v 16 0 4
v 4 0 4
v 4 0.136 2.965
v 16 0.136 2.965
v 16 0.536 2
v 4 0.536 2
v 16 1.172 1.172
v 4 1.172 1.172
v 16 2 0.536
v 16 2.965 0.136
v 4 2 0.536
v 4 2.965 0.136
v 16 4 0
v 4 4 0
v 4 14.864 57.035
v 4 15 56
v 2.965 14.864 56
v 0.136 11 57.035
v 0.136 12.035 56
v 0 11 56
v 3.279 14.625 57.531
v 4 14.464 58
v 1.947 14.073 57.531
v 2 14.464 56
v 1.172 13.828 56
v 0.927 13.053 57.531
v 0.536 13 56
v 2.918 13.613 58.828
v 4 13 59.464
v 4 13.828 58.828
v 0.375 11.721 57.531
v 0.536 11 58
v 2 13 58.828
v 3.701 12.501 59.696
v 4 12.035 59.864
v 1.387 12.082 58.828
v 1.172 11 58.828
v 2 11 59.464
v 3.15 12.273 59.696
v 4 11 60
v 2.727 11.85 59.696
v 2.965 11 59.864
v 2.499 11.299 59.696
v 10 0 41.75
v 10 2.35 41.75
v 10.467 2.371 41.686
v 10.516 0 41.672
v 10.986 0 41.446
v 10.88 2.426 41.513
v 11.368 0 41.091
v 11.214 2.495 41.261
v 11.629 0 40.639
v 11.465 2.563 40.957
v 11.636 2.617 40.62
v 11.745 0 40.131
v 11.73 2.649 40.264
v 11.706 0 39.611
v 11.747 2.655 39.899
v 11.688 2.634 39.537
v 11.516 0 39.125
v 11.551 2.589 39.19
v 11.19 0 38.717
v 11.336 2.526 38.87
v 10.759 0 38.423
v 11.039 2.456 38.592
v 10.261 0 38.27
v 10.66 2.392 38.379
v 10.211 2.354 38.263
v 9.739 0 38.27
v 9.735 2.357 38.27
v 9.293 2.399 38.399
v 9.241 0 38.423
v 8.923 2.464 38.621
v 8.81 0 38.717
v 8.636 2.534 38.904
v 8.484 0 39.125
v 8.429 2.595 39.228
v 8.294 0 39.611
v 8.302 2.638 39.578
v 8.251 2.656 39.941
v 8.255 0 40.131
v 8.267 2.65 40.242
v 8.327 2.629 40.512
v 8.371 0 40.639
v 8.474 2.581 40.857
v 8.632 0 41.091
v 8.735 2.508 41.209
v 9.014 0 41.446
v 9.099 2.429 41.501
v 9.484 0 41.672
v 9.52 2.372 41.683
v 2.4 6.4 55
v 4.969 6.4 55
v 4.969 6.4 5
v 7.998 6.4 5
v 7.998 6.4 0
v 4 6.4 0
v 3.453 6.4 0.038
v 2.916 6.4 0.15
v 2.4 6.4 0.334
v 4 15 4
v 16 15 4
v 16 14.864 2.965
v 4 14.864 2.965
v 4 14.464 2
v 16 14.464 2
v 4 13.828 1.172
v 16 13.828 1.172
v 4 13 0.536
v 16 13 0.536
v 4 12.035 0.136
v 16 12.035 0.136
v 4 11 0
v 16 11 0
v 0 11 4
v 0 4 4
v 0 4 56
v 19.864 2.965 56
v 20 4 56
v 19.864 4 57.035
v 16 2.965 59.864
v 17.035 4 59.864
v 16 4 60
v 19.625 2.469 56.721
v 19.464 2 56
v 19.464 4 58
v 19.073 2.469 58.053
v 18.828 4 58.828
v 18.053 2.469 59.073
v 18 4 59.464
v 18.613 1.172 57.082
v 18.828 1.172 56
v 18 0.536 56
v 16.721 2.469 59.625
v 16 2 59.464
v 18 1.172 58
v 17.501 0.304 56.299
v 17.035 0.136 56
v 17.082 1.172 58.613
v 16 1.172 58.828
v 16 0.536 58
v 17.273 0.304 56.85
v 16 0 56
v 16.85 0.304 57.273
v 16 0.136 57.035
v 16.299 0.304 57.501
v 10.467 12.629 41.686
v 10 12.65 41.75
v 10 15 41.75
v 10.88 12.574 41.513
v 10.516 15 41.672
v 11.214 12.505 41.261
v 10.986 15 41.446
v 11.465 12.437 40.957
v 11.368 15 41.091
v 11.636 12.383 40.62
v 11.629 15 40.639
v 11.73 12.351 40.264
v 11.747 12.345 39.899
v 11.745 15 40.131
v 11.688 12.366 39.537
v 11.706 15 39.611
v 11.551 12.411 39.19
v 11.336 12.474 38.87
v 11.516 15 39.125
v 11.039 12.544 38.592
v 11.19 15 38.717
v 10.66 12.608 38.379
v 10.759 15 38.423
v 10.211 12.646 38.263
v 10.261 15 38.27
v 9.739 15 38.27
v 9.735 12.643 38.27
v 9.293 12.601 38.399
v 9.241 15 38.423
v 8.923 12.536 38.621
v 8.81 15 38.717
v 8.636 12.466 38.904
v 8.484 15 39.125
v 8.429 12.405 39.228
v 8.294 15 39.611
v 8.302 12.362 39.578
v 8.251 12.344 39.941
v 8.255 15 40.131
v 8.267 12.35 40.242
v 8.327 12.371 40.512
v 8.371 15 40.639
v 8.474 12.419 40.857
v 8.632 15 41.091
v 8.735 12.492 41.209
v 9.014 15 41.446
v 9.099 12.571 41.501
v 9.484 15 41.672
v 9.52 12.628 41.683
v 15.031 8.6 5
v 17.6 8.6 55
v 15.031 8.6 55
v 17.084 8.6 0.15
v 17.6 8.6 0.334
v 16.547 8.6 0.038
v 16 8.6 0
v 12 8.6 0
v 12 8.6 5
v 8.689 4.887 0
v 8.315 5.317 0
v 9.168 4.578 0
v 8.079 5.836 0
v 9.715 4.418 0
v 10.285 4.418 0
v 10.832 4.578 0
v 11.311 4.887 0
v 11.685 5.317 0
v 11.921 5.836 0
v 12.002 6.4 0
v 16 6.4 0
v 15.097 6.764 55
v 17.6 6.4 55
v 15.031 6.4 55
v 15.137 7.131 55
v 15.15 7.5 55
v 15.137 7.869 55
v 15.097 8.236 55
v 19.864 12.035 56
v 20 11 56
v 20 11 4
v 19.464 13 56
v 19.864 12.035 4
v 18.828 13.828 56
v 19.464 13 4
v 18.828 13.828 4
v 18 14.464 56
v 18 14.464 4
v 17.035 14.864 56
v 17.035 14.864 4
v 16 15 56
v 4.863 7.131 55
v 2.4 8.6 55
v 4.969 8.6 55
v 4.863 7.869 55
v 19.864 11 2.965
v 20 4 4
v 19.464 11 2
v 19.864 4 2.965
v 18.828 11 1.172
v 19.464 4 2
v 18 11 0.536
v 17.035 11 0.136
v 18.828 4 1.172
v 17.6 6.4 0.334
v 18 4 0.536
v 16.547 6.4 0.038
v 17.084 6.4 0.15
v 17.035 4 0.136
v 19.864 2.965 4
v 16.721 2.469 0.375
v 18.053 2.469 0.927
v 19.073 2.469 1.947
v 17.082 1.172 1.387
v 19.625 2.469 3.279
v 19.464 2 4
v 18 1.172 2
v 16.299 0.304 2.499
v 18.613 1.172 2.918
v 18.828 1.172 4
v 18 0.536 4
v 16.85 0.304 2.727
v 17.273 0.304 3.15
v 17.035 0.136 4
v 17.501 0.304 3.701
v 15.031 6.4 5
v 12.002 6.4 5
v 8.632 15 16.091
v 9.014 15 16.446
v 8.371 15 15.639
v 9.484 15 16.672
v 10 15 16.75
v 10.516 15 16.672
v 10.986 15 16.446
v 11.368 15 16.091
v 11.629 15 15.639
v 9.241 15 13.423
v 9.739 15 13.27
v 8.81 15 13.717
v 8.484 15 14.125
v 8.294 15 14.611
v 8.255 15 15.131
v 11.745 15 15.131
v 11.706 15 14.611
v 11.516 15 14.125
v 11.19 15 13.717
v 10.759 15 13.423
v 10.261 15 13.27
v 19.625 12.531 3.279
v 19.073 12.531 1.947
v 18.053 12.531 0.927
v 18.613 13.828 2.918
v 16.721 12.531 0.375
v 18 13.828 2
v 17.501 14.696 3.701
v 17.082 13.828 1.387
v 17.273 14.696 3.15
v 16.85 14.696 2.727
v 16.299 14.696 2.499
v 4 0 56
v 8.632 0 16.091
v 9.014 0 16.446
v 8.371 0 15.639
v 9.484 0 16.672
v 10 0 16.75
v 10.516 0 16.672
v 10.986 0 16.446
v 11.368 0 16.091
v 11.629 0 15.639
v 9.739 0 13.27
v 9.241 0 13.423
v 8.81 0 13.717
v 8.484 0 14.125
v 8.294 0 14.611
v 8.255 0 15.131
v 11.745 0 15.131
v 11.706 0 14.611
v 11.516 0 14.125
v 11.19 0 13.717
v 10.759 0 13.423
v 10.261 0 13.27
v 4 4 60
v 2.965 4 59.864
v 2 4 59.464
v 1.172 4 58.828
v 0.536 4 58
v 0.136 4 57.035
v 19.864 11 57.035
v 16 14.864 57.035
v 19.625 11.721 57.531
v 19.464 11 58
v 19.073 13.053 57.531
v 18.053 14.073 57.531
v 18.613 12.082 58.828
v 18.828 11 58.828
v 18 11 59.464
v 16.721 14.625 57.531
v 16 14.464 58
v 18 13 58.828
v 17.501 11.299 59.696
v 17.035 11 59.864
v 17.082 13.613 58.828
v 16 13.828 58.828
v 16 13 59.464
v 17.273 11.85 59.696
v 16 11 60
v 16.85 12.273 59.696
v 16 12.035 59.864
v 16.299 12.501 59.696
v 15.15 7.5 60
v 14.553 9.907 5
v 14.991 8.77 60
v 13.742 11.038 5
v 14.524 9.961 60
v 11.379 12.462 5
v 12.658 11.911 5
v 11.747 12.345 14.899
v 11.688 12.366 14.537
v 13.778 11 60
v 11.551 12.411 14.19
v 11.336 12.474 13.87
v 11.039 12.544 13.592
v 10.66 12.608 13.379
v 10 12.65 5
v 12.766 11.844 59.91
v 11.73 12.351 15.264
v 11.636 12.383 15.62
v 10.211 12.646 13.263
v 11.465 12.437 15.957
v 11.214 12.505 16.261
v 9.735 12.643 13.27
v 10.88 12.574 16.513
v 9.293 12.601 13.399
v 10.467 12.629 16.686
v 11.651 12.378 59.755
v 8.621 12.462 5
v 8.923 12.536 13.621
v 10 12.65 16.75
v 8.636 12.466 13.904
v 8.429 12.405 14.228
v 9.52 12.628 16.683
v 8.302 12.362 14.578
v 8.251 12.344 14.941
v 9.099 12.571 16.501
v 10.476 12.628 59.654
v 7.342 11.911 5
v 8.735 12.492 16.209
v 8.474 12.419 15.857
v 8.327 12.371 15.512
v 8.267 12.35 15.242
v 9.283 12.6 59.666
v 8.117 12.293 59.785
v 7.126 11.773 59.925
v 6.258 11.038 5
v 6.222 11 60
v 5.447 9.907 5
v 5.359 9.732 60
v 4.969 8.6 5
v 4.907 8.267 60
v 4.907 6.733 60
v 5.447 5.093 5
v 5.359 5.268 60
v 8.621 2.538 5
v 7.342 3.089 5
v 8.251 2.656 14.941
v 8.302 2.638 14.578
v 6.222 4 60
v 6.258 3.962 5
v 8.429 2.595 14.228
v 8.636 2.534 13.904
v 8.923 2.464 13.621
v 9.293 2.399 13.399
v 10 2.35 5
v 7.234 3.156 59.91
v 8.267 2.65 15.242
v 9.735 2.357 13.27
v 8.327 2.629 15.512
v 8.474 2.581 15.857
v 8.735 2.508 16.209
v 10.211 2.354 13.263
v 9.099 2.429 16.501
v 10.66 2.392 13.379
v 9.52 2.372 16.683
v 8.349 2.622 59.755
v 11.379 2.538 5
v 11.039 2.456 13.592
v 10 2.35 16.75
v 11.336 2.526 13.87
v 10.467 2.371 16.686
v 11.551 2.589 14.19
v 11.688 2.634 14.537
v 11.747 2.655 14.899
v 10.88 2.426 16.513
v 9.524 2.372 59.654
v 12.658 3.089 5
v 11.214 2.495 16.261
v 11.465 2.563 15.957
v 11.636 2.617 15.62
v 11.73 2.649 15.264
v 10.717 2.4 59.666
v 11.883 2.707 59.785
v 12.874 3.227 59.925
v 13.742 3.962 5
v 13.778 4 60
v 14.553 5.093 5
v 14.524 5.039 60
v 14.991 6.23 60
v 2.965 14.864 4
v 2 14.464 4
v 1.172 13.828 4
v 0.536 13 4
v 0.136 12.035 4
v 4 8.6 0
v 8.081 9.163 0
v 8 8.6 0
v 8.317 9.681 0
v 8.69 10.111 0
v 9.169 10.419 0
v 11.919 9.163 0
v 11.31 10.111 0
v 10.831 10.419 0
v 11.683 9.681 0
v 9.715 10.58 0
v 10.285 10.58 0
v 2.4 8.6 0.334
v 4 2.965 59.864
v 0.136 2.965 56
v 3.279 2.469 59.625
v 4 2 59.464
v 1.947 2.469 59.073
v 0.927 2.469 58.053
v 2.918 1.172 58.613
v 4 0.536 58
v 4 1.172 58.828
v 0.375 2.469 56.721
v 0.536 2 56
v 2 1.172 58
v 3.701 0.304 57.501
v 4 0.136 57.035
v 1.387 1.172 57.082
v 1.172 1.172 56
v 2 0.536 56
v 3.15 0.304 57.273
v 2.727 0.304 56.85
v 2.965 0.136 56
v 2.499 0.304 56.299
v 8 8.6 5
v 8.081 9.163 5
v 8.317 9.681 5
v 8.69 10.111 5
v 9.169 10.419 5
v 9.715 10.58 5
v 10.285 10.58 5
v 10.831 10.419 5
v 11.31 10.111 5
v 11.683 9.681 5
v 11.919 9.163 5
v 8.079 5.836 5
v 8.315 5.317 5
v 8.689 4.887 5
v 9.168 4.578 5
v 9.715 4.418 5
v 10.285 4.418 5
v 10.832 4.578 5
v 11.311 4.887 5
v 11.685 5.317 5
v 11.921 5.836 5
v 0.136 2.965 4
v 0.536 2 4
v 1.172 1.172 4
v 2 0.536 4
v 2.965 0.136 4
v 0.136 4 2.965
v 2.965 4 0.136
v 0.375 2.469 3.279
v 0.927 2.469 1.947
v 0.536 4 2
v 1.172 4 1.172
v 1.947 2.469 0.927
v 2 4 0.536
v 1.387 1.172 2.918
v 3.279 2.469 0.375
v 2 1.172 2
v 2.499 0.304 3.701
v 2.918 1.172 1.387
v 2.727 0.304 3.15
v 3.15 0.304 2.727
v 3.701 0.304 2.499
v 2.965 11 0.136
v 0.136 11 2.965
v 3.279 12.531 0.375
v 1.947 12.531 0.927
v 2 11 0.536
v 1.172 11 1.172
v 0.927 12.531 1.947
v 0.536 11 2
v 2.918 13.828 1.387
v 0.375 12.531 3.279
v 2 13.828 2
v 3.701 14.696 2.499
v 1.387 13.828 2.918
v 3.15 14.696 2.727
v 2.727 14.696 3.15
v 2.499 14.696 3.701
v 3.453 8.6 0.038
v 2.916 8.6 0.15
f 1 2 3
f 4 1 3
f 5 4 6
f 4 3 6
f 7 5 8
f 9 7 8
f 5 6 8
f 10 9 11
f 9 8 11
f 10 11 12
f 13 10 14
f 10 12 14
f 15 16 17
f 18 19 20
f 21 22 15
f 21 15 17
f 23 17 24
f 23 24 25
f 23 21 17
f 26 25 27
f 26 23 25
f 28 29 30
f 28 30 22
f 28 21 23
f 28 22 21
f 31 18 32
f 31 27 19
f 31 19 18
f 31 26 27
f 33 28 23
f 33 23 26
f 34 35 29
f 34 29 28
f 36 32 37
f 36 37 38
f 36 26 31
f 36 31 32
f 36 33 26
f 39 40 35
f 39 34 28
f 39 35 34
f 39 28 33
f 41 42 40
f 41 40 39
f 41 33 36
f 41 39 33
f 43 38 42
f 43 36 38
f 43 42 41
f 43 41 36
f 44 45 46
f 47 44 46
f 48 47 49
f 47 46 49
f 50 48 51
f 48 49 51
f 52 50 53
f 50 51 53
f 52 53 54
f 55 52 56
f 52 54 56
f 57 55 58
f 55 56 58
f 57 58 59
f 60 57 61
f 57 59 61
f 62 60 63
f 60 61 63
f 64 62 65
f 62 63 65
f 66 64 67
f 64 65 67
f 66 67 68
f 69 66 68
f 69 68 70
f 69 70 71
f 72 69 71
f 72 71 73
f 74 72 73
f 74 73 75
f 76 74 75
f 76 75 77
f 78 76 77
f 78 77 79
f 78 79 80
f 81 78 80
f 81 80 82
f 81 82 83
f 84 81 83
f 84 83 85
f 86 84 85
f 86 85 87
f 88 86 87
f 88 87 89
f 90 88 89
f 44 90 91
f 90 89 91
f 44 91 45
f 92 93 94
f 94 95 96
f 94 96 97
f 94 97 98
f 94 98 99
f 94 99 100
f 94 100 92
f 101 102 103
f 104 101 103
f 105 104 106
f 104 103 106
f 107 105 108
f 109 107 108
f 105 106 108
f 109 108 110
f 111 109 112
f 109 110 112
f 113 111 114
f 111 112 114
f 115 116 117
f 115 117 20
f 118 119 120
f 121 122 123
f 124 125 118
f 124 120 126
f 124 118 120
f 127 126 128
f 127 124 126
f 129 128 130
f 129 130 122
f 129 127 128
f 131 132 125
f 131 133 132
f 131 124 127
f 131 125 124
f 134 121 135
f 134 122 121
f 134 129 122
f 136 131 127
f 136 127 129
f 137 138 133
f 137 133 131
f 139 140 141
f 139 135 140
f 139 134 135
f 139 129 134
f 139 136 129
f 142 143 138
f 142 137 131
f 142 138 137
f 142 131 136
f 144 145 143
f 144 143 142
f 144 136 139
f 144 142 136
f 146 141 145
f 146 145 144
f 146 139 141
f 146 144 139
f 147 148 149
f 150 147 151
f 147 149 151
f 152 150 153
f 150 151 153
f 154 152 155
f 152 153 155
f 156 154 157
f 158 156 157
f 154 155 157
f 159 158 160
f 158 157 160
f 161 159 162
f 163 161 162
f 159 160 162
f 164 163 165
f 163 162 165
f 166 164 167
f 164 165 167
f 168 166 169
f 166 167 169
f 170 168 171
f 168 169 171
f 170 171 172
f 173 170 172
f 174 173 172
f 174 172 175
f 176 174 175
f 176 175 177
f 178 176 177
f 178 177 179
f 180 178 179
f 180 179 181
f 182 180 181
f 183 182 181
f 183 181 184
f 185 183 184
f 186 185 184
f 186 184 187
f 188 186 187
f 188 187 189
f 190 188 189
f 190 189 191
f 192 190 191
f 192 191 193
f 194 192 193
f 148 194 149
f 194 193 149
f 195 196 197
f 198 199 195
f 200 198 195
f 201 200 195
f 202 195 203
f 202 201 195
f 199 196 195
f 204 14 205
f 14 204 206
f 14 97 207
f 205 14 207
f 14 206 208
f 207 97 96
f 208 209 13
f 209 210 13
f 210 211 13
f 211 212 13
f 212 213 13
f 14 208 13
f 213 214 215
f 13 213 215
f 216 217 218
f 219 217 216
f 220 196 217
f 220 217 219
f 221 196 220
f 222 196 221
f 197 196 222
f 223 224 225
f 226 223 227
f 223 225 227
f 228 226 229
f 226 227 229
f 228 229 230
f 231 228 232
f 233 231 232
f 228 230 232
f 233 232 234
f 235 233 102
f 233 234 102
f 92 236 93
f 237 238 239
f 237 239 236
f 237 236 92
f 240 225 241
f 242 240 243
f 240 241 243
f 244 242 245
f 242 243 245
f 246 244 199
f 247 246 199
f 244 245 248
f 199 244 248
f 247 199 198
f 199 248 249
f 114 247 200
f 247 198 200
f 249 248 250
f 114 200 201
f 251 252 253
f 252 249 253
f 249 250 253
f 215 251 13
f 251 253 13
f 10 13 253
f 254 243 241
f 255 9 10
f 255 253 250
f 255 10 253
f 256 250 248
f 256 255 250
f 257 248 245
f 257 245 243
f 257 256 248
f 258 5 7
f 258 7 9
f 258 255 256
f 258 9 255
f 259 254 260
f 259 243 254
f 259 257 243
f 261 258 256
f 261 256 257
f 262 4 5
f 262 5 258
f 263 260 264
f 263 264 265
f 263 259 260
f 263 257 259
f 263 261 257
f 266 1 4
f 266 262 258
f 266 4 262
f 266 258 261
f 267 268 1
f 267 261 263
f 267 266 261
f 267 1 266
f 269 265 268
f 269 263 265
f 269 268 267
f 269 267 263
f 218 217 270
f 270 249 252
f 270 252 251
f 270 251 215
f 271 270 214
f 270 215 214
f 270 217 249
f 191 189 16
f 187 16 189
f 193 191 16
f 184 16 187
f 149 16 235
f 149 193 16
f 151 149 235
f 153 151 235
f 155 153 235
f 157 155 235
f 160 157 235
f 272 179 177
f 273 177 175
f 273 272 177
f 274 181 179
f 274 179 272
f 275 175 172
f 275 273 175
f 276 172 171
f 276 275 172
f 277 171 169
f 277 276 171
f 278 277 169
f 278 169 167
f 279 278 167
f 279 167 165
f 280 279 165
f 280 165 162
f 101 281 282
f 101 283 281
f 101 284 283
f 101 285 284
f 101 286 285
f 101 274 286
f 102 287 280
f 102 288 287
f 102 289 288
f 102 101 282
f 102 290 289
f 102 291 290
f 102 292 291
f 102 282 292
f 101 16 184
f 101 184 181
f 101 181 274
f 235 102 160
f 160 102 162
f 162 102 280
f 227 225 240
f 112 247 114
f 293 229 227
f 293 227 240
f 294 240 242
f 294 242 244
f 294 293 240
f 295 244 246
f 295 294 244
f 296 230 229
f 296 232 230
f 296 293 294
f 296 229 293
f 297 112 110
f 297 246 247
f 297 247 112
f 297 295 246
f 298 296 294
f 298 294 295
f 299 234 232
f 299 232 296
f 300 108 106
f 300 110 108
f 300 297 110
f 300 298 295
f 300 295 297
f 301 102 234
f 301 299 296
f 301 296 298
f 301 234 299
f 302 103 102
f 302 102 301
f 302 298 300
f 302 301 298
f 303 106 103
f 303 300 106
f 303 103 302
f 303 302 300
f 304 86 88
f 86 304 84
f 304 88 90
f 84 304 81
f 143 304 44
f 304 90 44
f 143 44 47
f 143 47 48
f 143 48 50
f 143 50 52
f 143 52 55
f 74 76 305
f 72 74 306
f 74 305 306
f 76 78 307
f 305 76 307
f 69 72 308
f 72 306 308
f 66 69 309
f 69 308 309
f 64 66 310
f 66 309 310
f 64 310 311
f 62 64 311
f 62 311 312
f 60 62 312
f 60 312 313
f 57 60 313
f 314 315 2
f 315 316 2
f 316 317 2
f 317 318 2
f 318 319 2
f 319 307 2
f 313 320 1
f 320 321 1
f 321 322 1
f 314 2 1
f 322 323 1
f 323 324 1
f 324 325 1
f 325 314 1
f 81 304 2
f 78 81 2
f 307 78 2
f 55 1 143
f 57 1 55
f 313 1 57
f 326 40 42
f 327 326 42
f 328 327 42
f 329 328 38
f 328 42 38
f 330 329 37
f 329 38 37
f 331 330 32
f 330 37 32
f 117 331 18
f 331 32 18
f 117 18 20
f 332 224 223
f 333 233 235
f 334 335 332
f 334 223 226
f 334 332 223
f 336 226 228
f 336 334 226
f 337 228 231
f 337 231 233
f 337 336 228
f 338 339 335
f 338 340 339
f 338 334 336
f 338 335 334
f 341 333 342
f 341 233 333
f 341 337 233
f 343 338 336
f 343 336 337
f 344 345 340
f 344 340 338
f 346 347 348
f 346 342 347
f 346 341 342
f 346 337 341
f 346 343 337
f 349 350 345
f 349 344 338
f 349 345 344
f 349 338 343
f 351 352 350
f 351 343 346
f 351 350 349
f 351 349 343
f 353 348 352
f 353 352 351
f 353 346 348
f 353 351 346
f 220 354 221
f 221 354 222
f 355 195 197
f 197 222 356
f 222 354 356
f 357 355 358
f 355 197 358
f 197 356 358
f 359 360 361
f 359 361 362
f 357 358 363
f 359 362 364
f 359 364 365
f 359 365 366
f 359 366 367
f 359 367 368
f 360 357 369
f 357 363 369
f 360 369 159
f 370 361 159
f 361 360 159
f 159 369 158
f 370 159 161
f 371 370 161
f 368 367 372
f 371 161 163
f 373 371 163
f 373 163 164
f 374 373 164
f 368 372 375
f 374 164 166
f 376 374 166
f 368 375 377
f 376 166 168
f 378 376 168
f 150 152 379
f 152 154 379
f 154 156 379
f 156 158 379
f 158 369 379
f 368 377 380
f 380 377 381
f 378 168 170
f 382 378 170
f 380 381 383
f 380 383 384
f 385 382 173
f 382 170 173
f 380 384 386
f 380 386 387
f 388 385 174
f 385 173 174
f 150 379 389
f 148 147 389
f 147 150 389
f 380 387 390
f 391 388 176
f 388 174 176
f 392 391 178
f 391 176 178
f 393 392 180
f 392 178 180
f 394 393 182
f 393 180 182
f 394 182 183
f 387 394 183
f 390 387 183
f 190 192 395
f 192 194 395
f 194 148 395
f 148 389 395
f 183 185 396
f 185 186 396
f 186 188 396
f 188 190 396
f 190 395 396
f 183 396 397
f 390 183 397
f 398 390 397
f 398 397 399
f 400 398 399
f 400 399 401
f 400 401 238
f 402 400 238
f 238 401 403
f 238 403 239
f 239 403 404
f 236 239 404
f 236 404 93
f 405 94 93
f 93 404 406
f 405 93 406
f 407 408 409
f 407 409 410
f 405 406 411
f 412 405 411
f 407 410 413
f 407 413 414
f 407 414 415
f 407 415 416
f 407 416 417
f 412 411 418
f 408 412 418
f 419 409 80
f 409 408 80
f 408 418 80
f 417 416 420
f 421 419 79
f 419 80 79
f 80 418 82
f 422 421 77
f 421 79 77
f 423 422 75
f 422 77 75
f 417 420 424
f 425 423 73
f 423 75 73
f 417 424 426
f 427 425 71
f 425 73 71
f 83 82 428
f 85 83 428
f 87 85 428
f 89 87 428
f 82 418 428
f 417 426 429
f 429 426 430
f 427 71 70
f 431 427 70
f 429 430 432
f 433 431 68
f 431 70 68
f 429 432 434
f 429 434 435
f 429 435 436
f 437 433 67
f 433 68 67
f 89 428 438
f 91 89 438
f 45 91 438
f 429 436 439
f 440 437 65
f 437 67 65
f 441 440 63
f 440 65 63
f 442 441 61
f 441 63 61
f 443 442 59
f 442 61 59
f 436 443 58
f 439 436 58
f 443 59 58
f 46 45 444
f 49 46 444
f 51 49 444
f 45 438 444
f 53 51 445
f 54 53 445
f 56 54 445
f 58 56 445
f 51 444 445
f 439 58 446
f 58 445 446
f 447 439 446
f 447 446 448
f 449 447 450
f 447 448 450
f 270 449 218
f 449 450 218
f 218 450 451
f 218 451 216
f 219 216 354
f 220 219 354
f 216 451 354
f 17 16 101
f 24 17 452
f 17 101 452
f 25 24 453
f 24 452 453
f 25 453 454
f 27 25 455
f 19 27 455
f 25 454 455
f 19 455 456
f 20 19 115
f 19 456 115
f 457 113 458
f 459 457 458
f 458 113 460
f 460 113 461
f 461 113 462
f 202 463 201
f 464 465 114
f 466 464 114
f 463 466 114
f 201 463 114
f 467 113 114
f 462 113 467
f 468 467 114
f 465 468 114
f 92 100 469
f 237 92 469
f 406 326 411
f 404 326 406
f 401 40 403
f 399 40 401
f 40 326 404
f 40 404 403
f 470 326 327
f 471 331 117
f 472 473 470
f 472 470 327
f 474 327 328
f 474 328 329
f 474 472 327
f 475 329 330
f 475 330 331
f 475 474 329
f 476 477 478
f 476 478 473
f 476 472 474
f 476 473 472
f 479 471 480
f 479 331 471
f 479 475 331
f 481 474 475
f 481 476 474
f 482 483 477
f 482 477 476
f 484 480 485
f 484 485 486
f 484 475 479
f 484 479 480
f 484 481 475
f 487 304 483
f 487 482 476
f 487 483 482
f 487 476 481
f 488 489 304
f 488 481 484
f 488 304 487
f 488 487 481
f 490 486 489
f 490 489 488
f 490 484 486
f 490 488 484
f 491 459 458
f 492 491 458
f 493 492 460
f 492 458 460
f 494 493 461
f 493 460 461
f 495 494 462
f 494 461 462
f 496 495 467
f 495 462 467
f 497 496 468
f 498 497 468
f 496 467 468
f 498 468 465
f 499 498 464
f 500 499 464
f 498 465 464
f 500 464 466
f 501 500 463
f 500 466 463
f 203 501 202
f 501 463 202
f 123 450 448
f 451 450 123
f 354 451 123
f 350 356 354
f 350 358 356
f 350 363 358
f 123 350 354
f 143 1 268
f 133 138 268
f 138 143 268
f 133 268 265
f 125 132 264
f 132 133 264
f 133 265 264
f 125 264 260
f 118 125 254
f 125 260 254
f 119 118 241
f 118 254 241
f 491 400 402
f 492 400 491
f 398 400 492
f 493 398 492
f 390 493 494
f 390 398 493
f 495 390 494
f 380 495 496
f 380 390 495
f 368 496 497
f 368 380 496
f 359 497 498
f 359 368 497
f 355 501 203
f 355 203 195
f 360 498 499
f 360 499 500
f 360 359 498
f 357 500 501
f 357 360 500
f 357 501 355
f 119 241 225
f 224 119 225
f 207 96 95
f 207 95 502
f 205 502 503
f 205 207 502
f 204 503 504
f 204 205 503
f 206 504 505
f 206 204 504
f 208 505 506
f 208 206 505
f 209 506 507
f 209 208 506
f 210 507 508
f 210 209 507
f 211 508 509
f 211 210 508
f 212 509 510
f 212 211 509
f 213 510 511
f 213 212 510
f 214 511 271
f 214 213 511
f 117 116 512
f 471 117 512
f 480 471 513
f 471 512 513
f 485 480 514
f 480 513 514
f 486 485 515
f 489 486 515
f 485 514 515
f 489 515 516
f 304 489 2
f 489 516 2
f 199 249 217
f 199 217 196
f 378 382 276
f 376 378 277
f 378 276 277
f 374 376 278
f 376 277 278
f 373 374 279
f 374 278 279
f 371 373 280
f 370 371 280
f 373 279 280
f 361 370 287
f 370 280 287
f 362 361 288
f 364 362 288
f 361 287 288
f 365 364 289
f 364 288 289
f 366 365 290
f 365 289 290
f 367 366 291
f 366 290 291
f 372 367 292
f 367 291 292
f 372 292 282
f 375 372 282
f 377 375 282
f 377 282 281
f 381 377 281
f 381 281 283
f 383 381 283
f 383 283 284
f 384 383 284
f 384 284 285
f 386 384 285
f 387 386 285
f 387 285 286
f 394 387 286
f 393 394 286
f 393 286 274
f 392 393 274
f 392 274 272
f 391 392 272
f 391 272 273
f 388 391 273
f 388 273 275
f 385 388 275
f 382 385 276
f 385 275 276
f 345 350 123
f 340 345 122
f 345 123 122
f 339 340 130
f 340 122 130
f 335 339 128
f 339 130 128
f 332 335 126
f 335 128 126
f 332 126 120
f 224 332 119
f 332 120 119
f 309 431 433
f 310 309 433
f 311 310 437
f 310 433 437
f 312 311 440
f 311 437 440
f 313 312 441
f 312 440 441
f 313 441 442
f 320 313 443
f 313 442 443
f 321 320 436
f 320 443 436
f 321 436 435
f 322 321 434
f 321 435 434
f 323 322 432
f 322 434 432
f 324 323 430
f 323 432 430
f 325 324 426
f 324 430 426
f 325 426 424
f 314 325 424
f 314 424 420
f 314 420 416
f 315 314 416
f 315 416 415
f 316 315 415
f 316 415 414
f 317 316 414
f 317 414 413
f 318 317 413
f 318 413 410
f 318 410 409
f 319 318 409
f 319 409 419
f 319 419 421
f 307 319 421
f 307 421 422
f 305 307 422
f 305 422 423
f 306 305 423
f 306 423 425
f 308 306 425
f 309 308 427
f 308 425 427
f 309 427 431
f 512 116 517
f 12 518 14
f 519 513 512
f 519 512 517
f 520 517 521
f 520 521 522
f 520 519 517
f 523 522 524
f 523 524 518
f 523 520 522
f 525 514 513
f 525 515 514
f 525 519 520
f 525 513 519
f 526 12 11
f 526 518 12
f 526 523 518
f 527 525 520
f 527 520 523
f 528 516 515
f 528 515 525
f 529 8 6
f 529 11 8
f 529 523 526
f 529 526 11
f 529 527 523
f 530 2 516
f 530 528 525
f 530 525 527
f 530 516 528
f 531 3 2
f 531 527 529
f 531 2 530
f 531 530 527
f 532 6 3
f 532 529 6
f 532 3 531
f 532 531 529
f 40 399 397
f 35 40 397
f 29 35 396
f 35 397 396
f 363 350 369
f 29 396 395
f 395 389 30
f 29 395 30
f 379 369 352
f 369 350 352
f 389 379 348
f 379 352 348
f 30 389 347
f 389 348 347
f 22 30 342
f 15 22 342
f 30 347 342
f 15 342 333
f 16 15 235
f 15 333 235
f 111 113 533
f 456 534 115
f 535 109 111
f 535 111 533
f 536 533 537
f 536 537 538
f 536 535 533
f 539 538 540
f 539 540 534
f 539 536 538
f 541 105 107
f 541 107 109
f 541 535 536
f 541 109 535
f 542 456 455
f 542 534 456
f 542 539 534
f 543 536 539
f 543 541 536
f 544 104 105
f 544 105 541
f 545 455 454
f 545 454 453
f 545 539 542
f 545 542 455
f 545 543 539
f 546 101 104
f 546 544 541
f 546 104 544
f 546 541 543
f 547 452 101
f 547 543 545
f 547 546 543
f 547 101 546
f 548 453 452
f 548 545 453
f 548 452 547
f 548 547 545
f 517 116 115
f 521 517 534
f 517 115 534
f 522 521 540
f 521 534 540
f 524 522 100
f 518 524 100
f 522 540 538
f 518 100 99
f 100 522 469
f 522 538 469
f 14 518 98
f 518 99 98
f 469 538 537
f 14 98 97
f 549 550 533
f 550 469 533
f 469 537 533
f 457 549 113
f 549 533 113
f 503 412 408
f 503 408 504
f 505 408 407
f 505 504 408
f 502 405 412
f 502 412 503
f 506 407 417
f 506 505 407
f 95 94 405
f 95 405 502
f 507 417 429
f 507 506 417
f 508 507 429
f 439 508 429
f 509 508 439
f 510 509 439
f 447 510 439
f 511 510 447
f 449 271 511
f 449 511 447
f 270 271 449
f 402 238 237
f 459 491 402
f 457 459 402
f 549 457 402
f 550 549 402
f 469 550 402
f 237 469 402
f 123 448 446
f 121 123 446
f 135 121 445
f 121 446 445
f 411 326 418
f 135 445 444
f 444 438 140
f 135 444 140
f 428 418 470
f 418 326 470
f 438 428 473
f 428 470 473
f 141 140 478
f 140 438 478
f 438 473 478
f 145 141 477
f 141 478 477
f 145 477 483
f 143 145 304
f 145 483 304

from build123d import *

# Parameters (mm, degrees)
SKETCH1_W           = 20
SKETCH1_H           = 15
BOSS_EXTRUDE1_DEPTH = 60
SKETCH2_R           = 5.15
CUT_EXTRUDE1_DEPTH  = 55
SKETCH3_W           = 15.2
SKETCH3_H           = 2.2
CUT_EXTRUDE2_DEPTH  = 55
SKETCH4_R           = 1.75
CUT_EXTRUDE3_DEPTH  = 66
FILLET1_R           = 4
FILLET3_R           = 4
CUT_EXTRUDE4_REACH  = 67


with BuildPart() as part:
    # Sketch1 → Boss-Extrude1 (new body)
    with BuildSketch(Plane.XY):
        with Locations((10, 7.5)):
            Rectangle(SKETCH1_W, SKETCH1_H)
    extrude(amount=BOSS_EXTRUDE1_DEPTH)

    # Sketch2 → Cut-Extrude1 (cut)
    with BuildSketch(Plane.XY.offset(60)):
        with Locations((10, 7.5)):
            Circle(SKETCH2_R)
    extrude(amount=-CUT_EXTRUDE1_DEPTH, mode=Mode.SUBTRACT)

    # Sketch3 → Cut-Extrude2 (cut)
    with BuildSketch(Plane(origin=(0, 0, 0), x_dir=(-1, 0, 0), z_dir=(0, 0, -1))):
        with Locations((-10, 7.5)):
            Rectangle(SKETCH3_W, SKETCH3_H)
    extrude(amount=-CUT_EXTRUDE2_DEPTH, mode=Mode.SUBTRACT)

    # Sketch4 → Cut-Extrude3 (cut, through all)
    with BuildSketch(Plane(origin=(0, 15, 0), x_dir=(1, 0, 0), z_dir=(0, 1, 0))):
        with Locations(Location((10, -15, 0), (0, 0, 270))):
            Circle(SKETCH4_R)
        with Locations(Location((10, -40, 0), (0, 0, 270))):
            Circle(SKETCH4_R)
    extrude(amount=-CUT_EXTRUDE3_DEPTH, mode=Mode.SUBTRACT)

    # Fillet1
    # the kernel refuses this fillet: 4 mm, written as the material it takes off along each edge
    with BuildSketch(Plane(origin=(0, 15, -10), x_dir=(0, -1, 0), z_dir=(0, 0, 1)), Plane(origin=(0, 0, -10), x_dir=(1, 0, 0), z_dir=(0, 0, 1))) as fillet1_piece_1:
        with BuildLine():
            CenterArc((FILLET1_R, FILLET1_R), FILLET1_R, 180, 90)
            Line((0, FILLET1_R), (0, 0))
            Line((0, 0), (FILLET1_R, 0))
        make_face()
    extrude(amount=80, mode=Mode.SUBTRACT)
    with BuildSketch(Plane(origin=(0, 25, 60), x_dir=(0, 0, -1), z_dir=(0, -1, 0)), Plane(origin=(20, -10, 0), x_dir=(-1, 0, 0), z_dir=(0, 1, 0))) as fillet1_piece_2:
        with BuildLine():
            CenterArc((FILLET1_R, FILLET1_R), FILLET1_R, 180, 90)
            Line((0, FILLET1_R), (0, 0))
            Line((0, 0), (FILLET1_R, 0))
        make_face()
    extrude(amount=35, mode=Mode.SUBTRACT)
    with BuildSketch(Plane(origin=(0, 25, 0), x_dir=(0, 0, 1), z_dir=(0, -1, 0)), Plane(origin=(20, -10, 60), x_dir=(-1, 0, 0), z_dir=(0, 1, 0))) as fillet1_piece_3:
        with BuildLine():
            CenterArc((FILLET1_R, -FILLET1_R), FILLET1_R, 90, 90)
            Line((0, -FILLET1_R), (0, 0))
            Line((0, 0), (FILLET1_R, 0))
        make_face()
    extrude(amount=35, mode=Mode.SUBTRACT)
    with BuildSketch(Plane(origin=(20, 0, -10), x_dir=(-1, 0, 0), z_dir=(0, 0, 1)), Plane(origin=(20, 15, -10), x_dir=(0, -1, 0), z_dir=(0, 0, 1))) as fillet1_piece_4:
        with BuildLine():
            CenterArc((FILLET1_R, -FILLET1_R), FILLET1_R, 90, 90)
            Line((0, -FILLET1_R), (0, 0))
            Line((0, 0), (FILLET1_R, 0))
        make_face()
    extrude(amount=80, mode=Mode.SUBTRACT)

    # Fillet3
    # the kernel refuses this fillet: 4 mm, written as the material it takes off along each edge
    with BuildSketch(Plane(origin=(4, 4, 56), x_dir=(0, 0, 1), z_dir=(0, -1, 0))) as fillet3_piece_1_section:
        Polygon((0, 0), (FILLET3_R, 0), (FILLET3_R, FILLET3_R), (0, FILLET3_R), align=None)
    fillet3_piece_1 = extrude(amount=FILLET3_R, mode=Mode.PRIVATE)
    fillet3_piece_1 = fillet3_piece_1 - Plane(origin=(4, 4, 56), x_dir=(0.7071067811865475, 0, -0.7071067811865475), z_dir=(0, -1, 0)) * Sphere(FILLET3_R, mode=Mode.PRIVATE)
    add(fillet3_piece_1, mode=Mode.SUBTRACT)
    with BuildSketch(Plane(origin=(4, 4, 4), x_dir=(0, 0, -1), z_dir=(0, -1, 0))) as fillet3_piece_2_section:
        Polygon((0, 0), (FILLET3_R, 0), (FILLET3_R, -FILLET3_R), (0, -FILLET3_R), align=None)
    fillet3_piece_2 = extrude(amount=FILLET3_R, mode=Mode.PRIVATE)
    fillet3_piece_2 = fillet3_piece_2 - Plane(origin=(4, 4, 4), x_dir=(0.7071067811865475, 0, 0.7071067811865475), z_dir=(0, -1, 0)) * Sphere(FILLET3_R, mode=Mode.PRIVATE)
    add(fillet3_piece_2, mode=Mode.SUBTRACT)
    with BuildSketch(Plane(origin=(4, 11, 56), x_dir=(0, 1, 0), z_dir=(0, 0, 1))) as fillet3_piece_3_section:
        Polygon((0, 0), (FILLET3_R, 0), (FILLET3_R, FILLET3_R), (0, FILLET3_R), align=None)
    fillet3_piece_3 = extrude(amount=FILLET3_R, mode=Mode.PRIVATE)
    fillet3_piece_3 = fillet3_piece_3 - Plane(origin=(4, 11, 56), x_dir=(0.7071067811865475, -0.7071067811865475, 0), z_dir=(0, 0, 1)) * Sphere(FILLET3_R, mode=Mode.PRIVATE)
    add(fillet3_piece_3, mode=Mode.SUBTRACT)
    with BuildSketch(Plane(origin=(4, 11, 4), x_dir=(0, 0, -1), z_dir=(0, 1, 0))) as fillet3_piece_4_section:
        Polygon((0, 0), (FILLET3_R, 0), (FILLET3_R, FILLET3_R), (0, FILLET3_R), align=None)
    fillet3_piece_4 = extrude(amount=FILLET3_R, mode=Mode.PRIVATE)
    fillet3_piece_4 = fillet3_piece_4 - Plane(origin=(4, 11, 4), x_dir=(0.7071067811865475, 0, 0.7071067811865475), z_dir=(0, 1, 0)) * Sphere(FILLET3_R, mode=Mode.PRIVATE)
    add(fillet3_piece_4, mode=Mode.SUBTRACT)
    with BuildSketch(Plane(origin=(16, 11, 56), x_dir=(0, 1, 0), z_dir=(0, 0, 1))) as fillet3_piece_5_section:
        Polygon((0, 0), (FILLET3_R, 0), (FILLET3_R, -FILLET3_R), (0, -FILLET3_R), align=None)
    fillet3_piece_5 = extrude(amount=FILLET3_R, mode=Mode.PRIVATE)
    fillet3_piece_5 = fillet3_piece_5 - Plane(origin=(16, 11, 56), x_dir=(-0.7071067811865475, -0.7071067811865475, 0), z_dir=(0, 0, 1)) * Sphere(FILLET3_R, mode=Mode.PRIVATE)
    add(fillet3_piece_5, mode=Mode.SUBTRACT)
    with BuildSketch(Plane(origin=(16, 11, 4), x_dir=(0, 0, -1), z_dir=(0, 1, 0))) as fillet3_piece_6_section:
        Polygon((0, 0), (FILLET3_R, 0), (FILLET3_R, -FILLET3_R), (0, -FILLET3_R), align=None)
    fillet3_piece_6 = extrude(amount=FILLET3_R, mode=Mode.PRIVATE)
    fillet3_piece_6 = fillet3_piece_6 - Plane(origin=(16, 11, 4), x_dir=(-0.7071067811865475, 0, 0.7071067811865475), z_dir=(0, 1, 0)) * Sphere(FILLET3_R, mode=Mode.PRIVATE)
    add(fillet3_piece_6, mode=Mode.SUBTRACT)
    with BuildSketch(Plane(origin=(16, 4, 56), x_dir=(0, 0, 1), z_dir=(0, -1, 0))) as fillet3_piece_7_section:
        Polygon((0, 0), (FILLET3_R, 0), (FILLET3_R, -FILLET3_R), (0, -FILLET3_R), align=None)
    fillet3_piece_7 = extrude(amount=FILLET3_R, mode=Mode.PRIVATE)
    fillet3_piece_7 = fillet3_piece_7 - Plane(origin=(16, 4, 56), x_dir=(-0.7071067811865475, 0, -0.7071067811865475), z_dir=(0, -1, 0)) * Sphere(FILLET3_R, mode=Mode.PRIVATE)
    add(fillet3_piece_7, mode=Mode.SUBTRACT)
    with BuildSketch(Plane(origin=(16, 4, 4), x_dir=(0, 0, -1), z_dir=(0, -1, 0))) as fillet3_piece_8_section:
        Polygon((0, 0), (FILLET3_R, 0), (FILLET3_R, FILLET3_R), (0, FILLET3_R), align=None)
    fillet3_piece_8 = extrude(amount=FILLET3_R, mode=Mode.PRIVATE)
    fillet3_piece_8 = fillet3_piece_8 - Plane(origin=(16, 4, 4), x_dir=(-0.7071067811865475, 0, 0.7071067811865475), z_dir=(0, -1, 0)) * Sphere(FILLET3_R, mode=Mode.PRIVATE)
    add(fillet3_piece_8, mode=Mode.SUBTRACT)
    with BuildSketch(Plane(origin=(16, 15, 0), x_dir=(0, 0, 1), z_dir=(-1, 0, 0)), Plane(origin=(16, 15, 60), x_dir=(0, -1, 0), z_dir=(-1, 0, 0)), Plane(origin=(4, 0, 0), x_dir=(0, 0, 1), z_dir=(1, 0, 0))) as fillet3_piece_9:
        with BuildLine():
            CenterArc((FILLET3_R, -FILLET3_R), FILLET3_R, 90, 90)
            Line((0, -FILLET3_R), (0, 0))
            Line((0, 0), (FILLET3_R, 0))
        make_face()
    extrude(amount=12, mode=Mode.SUBTRACT)
    with BuildSketch(Plane(origin=(4, 0, 60), x_dir=(0, 0, -1), z_dir=(1, 0, 0))) as fillet3_piece_10:
        with BuildLine():
            CenterArc((FILLET3_R, FILLET3_R), FILLET3_R, 180, 90)
            Line((0, FILLET3_R), (0, 0))
            Line((0, 0), (FILLET3_R, 0))
        make_face()
    extrude(amount=12, mode=Mode.SUBTRACT)

    # Sketch5 → Cut-Extrude4 (cut, up to next)
    with BuildSketch(Plane(origin=(0, 0, 0), x_dir=(-1, 0, 0), z_dir=(0, 0, -1)), mode=Mode.PRIVATE) as cut_extrude4_sk1:
        with BuildLine():
            Line((-12, 8.6), (-8, 8.6))
            ThreePointArc((-8, 8.6), (-10, 10.6), (-12, 8.6))
        make_face()
    cut_extrude4_tool1 = extrude(cut_extrude4_sk1.sketch, amount=-CUT_EXTRUDE4_REACH, mode=Mode.PRIVATE) & part.part
    # Sketch5 → Cut-Extrude4 (cut, up to next)
    with BuildSketch(Plane(origin=(0, 0, 0), x_dir=(-1, 0, 0), z_dir=(0, 0, -1)), mode=Mode.PRIVATE) as cut_extrude4_sk2:
        with BuildLine():
            Line((-12.002485504, 6.4), (-7.997514496, 6.4))
            ThreePointArc((-7.997514496, 6.4), (-10, 4.397514496), (-12.002485504, 6.4))
        make_face()
    cut_extrude4_tool2 = extrude(cut_extrude4_sk2.sketch, amount=-CUT_EXTRUDE4_REACH, mode=Mode.PRIVATE) & part.part
    add(cut_extrude4_tool1.solids().sort_by_distance((10, 9.448826, 0))[0], mode=Mode.SUBTRACT)
    add(cut_extrude4_tool2.solids().sort_by_distance((10, 5.550119, 0))[0], mode=Mode.SUBTRACT)


solid = part.part
